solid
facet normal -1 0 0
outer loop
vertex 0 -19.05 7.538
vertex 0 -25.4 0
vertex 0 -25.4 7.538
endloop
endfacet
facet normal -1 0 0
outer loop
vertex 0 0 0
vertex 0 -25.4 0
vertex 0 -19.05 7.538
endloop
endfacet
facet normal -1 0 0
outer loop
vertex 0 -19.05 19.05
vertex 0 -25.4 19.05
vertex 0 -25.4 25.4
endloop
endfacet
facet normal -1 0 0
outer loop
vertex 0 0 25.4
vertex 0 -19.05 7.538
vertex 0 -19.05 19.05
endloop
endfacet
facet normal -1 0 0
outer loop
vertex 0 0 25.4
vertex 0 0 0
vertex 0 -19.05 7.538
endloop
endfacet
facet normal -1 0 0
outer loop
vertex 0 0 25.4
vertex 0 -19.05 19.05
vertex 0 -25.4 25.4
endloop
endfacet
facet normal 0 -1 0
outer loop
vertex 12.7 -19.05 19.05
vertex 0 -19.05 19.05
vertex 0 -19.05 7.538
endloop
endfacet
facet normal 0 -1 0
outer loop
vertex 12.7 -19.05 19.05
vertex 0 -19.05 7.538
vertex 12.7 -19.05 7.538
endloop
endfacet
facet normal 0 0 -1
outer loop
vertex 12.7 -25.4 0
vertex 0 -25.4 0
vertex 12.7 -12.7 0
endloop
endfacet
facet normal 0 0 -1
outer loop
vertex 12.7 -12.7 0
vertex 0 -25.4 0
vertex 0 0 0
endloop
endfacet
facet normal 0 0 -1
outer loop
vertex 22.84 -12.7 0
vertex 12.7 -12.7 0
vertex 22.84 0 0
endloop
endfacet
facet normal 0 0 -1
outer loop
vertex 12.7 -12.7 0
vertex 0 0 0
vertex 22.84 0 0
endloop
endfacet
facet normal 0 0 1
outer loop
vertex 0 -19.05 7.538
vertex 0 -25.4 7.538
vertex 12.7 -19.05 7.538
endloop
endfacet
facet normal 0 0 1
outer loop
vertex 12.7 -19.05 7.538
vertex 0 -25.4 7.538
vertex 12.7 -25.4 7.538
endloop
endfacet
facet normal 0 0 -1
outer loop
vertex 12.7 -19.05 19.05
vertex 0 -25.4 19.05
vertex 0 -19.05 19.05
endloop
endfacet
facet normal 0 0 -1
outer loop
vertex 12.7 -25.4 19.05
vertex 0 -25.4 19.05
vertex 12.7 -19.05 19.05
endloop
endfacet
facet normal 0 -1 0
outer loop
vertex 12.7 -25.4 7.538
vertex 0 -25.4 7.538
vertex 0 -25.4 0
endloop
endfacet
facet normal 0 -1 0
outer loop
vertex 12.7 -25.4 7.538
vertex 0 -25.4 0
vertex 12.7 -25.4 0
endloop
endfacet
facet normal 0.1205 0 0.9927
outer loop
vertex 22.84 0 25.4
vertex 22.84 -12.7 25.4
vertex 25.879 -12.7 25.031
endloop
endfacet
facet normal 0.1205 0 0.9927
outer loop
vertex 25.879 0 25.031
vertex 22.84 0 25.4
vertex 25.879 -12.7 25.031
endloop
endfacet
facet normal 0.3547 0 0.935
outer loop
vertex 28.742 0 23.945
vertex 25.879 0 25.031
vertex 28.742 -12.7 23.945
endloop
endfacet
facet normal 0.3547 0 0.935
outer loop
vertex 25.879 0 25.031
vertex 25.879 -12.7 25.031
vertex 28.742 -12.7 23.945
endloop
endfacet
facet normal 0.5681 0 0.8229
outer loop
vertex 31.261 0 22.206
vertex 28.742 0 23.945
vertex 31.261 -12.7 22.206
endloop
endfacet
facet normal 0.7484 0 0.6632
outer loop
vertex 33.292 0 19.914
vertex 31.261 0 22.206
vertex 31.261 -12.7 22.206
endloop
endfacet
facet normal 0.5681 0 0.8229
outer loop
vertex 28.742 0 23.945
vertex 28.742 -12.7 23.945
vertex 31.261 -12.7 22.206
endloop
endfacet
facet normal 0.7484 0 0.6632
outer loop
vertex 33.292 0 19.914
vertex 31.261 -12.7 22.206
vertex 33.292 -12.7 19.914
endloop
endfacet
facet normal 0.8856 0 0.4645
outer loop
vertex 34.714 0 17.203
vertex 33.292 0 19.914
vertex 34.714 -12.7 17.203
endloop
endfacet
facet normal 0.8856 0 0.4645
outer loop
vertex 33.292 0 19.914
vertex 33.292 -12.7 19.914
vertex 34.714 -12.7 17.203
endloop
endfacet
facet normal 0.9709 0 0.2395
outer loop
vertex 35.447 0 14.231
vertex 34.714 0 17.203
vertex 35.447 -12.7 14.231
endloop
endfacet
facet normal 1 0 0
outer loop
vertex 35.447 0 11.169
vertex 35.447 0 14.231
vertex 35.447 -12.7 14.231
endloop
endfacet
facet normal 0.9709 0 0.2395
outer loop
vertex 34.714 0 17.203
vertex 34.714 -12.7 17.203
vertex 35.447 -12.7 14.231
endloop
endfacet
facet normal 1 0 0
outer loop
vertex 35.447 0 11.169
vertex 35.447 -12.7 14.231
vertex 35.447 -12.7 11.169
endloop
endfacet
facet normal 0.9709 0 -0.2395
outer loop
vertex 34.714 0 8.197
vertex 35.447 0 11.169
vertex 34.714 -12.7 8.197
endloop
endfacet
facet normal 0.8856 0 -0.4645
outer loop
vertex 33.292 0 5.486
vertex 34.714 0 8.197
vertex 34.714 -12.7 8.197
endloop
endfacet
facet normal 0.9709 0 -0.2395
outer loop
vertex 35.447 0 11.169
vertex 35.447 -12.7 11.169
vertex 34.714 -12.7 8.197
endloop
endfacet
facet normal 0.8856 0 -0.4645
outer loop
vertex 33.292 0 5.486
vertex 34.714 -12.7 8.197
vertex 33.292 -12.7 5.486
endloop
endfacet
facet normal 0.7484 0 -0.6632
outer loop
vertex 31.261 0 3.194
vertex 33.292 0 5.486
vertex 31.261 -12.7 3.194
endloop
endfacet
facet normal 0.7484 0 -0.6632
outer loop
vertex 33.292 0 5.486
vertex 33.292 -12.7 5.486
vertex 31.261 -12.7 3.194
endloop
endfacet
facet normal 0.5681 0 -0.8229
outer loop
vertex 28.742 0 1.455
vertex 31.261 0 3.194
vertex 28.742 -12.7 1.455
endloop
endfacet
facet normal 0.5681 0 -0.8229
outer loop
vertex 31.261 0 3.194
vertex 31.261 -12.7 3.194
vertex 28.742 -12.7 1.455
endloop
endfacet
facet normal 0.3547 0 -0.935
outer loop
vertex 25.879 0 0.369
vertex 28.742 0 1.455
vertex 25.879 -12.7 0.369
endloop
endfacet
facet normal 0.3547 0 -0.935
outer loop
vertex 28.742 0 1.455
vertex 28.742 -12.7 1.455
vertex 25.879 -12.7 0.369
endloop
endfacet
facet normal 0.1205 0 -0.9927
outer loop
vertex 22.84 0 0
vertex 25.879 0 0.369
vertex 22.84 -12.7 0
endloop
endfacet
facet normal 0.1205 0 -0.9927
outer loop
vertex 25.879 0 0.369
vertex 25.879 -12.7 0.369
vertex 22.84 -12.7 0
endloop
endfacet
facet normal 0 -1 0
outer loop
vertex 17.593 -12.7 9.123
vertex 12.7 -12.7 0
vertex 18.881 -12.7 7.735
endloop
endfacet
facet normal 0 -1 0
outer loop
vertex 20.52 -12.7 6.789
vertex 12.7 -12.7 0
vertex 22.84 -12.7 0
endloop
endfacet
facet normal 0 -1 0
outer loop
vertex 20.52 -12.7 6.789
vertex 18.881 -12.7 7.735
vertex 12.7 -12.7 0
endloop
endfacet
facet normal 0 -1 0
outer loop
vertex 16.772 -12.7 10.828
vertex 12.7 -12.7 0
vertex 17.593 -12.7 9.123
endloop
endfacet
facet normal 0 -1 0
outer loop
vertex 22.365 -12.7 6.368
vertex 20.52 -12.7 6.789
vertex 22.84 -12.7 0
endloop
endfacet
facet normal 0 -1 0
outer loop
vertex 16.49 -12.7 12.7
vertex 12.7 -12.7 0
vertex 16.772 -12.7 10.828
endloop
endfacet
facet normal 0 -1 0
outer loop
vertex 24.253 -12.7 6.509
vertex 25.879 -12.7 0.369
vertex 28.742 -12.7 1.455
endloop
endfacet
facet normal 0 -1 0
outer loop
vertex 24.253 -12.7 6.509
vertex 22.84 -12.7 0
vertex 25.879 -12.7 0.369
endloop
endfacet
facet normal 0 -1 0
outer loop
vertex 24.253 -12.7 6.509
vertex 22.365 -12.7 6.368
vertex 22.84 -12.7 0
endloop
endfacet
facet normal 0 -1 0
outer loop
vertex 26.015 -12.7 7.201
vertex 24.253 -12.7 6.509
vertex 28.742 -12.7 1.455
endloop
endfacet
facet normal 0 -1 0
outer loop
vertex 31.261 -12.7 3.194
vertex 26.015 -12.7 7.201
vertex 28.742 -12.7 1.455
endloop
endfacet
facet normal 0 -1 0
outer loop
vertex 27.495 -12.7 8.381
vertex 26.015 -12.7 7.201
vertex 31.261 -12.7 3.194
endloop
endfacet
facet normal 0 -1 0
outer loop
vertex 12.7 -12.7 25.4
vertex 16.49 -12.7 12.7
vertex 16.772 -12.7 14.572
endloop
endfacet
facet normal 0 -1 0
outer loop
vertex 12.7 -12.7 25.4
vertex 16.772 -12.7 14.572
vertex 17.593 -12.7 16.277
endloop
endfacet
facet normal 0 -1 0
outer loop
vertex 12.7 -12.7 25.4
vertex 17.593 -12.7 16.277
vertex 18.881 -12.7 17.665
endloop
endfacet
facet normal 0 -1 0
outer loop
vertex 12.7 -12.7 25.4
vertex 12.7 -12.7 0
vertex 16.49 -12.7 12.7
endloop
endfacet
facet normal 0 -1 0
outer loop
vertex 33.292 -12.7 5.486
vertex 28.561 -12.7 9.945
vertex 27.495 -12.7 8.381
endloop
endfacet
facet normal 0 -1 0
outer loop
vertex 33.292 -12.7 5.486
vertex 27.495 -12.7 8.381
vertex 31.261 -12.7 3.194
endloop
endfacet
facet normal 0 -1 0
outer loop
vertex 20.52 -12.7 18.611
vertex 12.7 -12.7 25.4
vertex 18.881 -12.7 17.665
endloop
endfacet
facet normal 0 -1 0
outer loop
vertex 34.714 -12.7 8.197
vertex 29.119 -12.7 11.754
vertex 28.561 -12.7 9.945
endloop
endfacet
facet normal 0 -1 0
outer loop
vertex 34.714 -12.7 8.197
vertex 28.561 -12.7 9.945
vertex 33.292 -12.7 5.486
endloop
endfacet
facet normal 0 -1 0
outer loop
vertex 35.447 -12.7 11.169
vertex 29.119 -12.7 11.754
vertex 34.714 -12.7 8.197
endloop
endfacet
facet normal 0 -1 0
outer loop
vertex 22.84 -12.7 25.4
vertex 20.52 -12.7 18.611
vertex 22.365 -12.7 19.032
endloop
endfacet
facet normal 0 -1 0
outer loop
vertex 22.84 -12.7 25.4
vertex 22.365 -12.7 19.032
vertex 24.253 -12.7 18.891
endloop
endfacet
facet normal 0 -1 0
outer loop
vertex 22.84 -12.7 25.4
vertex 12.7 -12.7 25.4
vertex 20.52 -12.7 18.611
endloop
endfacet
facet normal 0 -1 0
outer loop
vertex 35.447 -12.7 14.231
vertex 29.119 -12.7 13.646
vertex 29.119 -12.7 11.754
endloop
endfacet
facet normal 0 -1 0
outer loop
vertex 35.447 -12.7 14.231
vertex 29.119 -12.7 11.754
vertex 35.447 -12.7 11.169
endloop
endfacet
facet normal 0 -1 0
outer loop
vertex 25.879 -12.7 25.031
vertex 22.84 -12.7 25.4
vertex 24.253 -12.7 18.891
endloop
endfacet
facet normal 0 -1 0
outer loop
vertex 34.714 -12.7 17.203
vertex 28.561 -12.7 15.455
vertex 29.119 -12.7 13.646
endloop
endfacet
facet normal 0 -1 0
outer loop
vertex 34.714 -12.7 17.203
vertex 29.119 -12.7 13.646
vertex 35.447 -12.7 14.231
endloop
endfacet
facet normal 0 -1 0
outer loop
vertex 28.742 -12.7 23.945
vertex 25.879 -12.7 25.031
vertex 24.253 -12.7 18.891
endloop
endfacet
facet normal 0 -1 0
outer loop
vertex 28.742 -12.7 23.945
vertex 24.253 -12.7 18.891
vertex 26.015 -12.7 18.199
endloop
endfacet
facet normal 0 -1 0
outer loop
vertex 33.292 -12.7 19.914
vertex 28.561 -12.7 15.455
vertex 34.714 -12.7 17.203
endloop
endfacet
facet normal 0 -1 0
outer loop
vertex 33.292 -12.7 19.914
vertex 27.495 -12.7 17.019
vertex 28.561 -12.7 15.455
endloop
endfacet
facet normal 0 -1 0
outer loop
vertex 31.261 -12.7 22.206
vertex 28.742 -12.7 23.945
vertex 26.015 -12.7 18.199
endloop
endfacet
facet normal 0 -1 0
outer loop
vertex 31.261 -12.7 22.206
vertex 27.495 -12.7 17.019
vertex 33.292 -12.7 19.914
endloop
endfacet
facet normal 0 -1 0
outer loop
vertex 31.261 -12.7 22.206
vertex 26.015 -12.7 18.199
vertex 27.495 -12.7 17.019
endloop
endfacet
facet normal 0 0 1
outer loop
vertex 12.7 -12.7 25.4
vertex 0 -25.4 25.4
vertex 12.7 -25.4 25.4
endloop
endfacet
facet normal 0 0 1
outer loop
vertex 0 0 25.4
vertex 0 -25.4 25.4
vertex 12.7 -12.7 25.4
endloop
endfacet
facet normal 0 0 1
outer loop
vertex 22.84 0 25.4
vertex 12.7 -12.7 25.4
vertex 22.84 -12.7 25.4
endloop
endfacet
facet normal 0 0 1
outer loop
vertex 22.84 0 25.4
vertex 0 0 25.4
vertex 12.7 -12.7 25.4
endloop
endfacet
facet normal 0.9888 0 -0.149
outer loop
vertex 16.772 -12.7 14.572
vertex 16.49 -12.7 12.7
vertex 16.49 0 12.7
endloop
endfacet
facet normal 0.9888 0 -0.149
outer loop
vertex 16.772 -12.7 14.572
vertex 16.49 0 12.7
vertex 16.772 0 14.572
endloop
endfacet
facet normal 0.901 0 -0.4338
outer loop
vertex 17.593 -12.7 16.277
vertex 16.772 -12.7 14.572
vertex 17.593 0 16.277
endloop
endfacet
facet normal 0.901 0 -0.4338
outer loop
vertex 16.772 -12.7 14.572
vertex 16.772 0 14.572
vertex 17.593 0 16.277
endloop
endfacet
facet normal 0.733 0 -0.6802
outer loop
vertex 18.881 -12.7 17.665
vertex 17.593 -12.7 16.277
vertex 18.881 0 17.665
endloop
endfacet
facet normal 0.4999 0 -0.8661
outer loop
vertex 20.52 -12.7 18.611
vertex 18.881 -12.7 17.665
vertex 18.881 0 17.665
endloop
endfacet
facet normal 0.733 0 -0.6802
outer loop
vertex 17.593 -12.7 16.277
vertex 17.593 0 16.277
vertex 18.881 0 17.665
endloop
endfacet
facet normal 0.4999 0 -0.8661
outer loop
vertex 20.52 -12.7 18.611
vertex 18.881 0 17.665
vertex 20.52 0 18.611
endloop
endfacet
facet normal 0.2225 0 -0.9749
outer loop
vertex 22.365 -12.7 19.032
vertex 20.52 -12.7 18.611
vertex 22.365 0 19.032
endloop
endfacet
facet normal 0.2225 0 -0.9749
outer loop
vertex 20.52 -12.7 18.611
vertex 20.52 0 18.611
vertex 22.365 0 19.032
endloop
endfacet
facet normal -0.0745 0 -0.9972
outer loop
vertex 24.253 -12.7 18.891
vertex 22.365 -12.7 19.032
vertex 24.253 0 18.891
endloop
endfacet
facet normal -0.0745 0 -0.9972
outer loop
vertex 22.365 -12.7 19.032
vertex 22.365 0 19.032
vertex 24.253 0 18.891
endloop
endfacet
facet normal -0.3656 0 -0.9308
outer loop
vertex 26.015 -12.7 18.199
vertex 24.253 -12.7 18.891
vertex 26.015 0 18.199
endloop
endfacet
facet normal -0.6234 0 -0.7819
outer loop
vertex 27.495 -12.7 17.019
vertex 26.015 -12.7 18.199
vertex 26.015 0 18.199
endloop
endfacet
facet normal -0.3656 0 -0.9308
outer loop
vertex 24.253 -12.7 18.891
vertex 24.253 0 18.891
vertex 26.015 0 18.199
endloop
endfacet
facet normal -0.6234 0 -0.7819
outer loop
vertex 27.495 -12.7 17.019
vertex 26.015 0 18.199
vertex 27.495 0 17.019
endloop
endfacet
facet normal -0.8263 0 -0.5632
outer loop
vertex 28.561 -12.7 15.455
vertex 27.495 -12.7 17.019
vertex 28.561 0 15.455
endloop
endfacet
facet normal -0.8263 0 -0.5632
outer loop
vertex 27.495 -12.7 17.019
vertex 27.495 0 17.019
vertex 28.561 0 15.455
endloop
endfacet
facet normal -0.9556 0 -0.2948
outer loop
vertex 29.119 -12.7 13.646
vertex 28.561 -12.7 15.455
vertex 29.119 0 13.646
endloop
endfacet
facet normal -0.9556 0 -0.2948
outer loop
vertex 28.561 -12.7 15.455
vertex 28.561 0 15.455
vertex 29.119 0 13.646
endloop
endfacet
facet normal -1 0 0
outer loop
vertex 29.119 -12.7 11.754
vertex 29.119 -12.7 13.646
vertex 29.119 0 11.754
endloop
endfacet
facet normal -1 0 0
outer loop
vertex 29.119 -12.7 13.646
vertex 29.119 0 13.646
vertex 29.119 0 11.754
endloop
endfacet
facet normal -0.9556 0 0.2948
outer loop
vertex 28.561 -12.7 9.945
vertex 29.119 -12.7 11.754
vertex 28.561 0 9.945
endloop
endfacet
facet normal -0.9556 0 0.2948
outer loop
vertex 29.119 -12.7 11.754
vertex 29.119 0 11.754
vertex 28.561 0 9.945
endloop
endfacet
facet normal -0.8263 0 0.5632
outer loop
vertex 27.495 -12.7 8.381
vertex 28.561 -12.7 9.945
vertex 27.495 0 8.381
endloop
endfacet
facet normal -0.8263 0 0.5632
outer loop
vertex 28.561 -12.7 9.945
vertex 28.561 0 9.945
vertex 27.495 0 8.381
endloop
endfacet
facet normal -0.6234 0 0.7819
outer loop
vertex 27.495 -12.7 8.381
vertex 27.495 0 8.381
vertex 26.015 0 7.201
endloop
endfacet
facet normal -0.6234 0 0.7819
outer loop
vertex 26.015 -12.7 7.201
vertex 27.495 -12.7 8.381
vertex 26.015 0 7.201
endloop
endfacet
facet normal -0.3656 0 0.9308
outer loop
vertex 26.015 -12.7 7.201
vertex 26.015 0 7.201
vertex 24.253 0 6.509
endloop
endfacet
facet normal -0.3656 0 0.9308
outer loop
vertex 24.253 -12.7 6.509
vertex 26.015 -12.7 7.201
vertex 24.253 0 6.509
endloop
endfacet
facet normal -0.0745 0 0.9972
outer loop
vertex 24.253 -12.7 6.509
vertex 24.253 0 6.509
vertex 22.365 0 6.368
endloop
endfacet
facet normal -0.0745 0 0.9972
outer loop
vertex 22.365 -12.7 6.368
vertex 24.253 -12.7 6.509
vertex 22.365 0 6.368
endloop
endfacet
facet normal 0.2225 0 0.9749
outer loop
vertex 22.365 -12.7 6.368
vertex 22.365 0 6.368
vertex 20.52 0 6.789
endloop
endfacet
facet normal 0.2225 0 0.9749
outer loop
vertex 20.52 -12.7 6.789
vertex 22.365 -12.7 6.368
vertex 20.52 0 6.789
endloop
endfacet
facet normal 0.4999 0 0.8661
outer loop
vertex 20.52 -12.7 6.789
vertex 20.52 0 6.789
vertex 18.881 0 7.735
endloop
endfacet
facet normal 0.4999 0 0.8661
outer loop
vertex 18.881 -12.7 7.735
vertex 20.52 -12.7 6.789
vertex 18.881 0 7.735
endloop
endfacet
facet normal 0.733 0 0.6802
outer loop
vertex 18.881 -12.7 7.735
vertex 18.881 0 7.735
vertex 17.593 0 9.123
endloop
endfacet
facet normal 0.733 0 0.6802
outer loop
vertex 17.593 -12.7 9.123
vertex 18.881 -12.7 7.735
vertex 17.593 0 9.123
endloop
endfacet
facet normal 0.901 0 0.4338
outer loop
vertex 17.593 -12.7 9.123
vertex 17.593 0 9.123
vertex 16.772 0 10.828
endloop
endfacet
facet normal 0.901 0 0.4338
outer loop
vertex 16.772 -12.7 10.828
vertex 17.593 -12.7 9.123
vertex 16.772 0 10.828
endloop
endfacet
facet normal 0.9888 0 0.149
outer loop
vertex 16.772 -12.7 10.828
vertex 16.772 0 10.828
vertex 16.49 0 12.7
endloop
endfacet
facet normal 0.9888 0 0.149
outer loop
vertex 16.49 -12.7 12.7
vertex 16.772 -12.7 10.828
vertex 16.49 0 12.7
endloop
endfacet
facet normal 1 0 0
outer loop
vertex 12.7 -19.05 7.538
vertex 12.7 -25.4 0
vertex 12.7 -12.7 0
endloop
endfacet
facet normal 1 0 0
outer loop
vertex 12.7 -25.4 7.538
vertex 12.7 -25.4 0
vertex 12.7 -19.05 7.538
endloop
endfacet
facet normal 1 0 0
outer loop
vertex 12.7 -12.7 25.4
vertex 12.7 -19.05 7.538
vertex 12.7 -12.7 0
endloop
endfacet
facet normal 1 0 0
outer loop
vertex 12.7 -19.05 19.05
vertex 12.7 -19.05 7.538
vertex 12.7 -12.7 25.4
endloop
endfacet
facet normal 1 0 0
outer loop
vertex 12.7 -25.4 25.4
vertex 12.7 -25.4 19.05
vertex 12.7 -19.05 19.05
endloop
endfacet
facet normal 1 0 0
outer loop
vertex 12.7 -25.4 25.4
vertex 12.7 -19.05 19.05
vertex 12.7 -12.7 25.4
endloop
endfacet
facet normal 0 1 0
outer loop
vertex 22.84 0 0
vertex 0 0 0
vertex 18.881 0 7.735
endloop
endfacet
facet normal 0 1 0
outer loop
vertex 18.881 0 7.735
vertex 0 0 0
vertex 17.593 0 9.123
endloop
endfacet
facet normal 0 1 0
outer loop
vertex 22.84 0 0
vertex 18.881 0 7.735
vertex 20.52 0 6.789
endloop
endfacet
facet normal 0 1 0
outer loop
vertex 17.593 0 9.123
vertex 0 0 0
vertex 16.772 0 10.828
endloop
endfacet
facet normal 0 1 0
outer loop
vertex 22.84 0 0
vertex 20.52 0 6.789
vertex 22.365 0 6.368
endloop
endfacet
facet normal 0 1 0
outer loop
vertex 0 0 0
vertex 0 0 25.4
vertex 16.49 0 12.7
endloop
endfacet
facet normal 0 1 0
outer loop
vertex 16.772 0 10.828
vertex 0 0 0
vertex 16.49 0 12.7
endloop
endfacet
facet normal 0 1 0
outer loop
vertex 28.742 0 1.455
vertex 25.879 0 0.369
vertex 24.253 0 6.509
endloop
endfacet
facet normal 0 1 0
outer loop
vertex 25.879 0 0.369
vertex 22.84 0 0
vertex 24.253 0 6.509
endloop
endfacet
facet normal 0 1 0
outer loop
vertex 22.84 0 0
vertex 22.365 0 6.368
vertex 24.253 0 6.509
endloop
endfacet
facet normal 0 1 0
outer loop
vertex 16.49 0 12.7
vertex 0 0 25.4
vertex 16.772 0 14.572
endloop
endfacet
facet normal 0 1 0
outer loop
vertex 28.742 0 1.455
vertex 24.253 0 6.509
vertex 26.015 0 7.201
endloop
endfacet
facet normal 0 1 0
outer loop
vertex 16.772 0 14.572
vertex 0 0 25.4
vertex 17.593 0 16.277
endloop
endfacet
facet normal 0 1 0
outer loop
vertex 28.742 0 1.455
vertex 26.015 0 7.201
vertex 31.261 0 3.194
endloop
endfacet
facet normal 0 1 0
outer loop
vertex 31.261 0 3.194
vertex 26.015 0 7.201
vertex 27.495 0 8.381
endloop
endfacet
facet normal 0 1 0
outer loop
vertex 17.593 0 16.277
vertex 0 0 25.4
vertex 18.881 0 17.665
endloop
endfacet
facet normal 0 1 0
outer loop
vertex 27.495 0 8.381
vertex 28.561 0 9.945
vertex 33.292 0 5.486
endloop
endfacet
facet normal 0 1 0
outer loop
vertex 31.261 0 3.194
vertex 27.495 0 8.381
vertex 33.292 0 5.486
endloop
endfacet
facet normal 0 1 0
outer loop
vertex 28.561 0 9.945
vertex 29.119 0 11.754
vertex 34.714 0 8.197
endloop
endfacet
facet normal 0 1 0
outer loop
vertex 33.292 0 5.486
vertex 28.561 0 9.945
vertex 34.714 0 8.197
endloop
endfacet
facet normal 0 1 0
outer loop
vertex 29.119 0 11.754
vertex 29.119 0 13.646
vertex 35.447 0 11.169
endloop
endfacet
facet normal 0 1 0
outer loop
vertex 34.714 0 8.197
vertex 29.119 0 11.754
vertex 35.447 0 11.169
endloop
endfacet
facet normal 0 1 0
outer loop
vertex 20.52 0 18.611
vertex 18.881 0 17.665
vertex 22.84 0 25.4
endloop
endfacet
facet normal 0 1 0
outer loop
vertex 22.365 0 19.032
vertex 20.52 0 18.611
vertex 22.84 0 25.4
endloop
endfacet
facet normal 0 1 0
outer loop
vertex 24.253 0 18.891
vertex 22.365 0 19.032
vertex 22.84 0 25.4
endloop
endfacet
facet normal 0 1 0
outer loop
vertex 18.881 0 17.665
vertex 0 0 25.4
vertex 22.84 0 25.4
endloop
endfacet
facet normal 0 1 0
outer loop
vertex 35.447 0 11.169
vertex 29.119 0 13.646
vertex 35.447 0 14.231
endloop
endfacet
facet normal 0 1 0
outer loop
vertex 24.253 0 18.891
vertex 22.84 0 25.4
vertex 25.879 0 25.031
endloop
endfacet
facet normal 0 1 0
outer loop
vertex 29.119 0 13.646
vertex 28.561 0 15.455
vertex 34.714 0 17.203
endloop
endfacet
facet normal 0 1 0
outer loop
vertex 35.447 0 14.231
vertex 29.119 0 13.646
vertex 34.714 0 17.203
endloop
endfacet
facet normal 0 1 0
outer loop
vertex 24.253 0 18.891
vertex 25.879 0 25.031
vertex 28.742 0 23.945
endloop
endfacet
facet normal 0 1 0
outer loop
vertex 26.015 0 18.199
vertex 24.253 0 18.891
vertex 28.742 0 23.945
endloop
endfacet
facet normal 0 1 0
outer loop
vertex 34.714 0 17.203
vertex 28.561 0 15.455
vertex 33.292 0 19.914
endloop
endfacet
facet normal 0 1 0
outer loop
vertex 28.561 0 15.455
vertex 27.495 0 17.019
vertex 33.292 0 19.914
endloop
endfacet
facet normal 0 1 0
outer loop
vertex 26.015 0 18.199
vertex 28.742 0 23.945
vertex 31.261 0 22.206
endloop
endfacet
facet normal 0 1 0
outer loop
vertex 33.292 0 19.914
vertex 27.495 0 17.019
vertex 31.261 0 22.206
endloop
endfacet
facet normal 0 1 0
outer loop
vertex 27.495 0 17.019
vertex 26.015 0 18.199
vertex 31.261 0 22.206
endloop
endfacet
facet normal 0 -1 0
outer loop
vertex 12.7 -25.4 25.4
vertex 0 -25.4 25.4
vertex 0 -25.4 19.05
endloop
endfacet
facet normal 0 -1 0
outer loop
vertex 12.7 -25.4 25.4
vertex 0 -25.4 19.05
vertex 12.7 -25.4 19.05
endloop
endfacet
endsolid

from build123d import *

# Parameters (mm, degrees)
F0_W     = 44.45
F0_H     = 25.4
F1_DEPTH = 25.4
F2_W     = 31.75
F2_H     = 25.4
F3_DEPTH = 12.7
F4_W     = 12.7
F4_H     = 11.5118098885
F5_DEPTH = 6.35
F7_DEPTH = 12.7
F9_D     = 12.7


with BuildPart() as f1:
    # F0 (on Front) → F1 (new body)
    with BuildSketch(Plane.XZ):
        with Locations((22.225, 12.7)):
            Rectangle(F0_W, F0_H)
    extrude(amount=F1_DEPTH)

    # F2 (on face) → F3 (cut)
    with BuildSketch(Plane.XZ.offset(25.4)):
        with Locations((28.575, 12.7)):
            Rectangle(F2_W, F2_H)
    extrude(amount=-F3_DEPTH, mode=Mode.SUBTRACT)

    # F4 (on face) → F5 (cut)
    with BuildSketch(Plane.XZ.offset(25.4)):
        with Locations((6.35, 13.2940950558)):
            Rectangle(F4_W, F4_H)
    extrude(amount=-F5_DEPTH, mode=Mode.SUBTRACT)

    # F6 (on face) → F7 (cut, through all)
    with BuildSketch(Plane.XZ.offset(12.7)):
        with BuildLine():
            Line((44.45, 25.4), (22.8397343308, 25.4))
            ThreePointArc((22.8397343308, 25.4), (35.5397343308, 12.7), (22.8397343308, 0))
            Line((22.8397343308, 0), (44.45, 0))
            Line((44.45, 0), (44.45, 25.4))
        make_face()
    extrude(amount=-F7_DEPTH, mode=Mode.SUBTRACT)

    # F9 (through all)
    with Locations(Plane.XZ.offset(12.7)):
        with Locations((22.8397343308, 12.7)):
            Hole(F9_D / 2)


solid = f1.part
